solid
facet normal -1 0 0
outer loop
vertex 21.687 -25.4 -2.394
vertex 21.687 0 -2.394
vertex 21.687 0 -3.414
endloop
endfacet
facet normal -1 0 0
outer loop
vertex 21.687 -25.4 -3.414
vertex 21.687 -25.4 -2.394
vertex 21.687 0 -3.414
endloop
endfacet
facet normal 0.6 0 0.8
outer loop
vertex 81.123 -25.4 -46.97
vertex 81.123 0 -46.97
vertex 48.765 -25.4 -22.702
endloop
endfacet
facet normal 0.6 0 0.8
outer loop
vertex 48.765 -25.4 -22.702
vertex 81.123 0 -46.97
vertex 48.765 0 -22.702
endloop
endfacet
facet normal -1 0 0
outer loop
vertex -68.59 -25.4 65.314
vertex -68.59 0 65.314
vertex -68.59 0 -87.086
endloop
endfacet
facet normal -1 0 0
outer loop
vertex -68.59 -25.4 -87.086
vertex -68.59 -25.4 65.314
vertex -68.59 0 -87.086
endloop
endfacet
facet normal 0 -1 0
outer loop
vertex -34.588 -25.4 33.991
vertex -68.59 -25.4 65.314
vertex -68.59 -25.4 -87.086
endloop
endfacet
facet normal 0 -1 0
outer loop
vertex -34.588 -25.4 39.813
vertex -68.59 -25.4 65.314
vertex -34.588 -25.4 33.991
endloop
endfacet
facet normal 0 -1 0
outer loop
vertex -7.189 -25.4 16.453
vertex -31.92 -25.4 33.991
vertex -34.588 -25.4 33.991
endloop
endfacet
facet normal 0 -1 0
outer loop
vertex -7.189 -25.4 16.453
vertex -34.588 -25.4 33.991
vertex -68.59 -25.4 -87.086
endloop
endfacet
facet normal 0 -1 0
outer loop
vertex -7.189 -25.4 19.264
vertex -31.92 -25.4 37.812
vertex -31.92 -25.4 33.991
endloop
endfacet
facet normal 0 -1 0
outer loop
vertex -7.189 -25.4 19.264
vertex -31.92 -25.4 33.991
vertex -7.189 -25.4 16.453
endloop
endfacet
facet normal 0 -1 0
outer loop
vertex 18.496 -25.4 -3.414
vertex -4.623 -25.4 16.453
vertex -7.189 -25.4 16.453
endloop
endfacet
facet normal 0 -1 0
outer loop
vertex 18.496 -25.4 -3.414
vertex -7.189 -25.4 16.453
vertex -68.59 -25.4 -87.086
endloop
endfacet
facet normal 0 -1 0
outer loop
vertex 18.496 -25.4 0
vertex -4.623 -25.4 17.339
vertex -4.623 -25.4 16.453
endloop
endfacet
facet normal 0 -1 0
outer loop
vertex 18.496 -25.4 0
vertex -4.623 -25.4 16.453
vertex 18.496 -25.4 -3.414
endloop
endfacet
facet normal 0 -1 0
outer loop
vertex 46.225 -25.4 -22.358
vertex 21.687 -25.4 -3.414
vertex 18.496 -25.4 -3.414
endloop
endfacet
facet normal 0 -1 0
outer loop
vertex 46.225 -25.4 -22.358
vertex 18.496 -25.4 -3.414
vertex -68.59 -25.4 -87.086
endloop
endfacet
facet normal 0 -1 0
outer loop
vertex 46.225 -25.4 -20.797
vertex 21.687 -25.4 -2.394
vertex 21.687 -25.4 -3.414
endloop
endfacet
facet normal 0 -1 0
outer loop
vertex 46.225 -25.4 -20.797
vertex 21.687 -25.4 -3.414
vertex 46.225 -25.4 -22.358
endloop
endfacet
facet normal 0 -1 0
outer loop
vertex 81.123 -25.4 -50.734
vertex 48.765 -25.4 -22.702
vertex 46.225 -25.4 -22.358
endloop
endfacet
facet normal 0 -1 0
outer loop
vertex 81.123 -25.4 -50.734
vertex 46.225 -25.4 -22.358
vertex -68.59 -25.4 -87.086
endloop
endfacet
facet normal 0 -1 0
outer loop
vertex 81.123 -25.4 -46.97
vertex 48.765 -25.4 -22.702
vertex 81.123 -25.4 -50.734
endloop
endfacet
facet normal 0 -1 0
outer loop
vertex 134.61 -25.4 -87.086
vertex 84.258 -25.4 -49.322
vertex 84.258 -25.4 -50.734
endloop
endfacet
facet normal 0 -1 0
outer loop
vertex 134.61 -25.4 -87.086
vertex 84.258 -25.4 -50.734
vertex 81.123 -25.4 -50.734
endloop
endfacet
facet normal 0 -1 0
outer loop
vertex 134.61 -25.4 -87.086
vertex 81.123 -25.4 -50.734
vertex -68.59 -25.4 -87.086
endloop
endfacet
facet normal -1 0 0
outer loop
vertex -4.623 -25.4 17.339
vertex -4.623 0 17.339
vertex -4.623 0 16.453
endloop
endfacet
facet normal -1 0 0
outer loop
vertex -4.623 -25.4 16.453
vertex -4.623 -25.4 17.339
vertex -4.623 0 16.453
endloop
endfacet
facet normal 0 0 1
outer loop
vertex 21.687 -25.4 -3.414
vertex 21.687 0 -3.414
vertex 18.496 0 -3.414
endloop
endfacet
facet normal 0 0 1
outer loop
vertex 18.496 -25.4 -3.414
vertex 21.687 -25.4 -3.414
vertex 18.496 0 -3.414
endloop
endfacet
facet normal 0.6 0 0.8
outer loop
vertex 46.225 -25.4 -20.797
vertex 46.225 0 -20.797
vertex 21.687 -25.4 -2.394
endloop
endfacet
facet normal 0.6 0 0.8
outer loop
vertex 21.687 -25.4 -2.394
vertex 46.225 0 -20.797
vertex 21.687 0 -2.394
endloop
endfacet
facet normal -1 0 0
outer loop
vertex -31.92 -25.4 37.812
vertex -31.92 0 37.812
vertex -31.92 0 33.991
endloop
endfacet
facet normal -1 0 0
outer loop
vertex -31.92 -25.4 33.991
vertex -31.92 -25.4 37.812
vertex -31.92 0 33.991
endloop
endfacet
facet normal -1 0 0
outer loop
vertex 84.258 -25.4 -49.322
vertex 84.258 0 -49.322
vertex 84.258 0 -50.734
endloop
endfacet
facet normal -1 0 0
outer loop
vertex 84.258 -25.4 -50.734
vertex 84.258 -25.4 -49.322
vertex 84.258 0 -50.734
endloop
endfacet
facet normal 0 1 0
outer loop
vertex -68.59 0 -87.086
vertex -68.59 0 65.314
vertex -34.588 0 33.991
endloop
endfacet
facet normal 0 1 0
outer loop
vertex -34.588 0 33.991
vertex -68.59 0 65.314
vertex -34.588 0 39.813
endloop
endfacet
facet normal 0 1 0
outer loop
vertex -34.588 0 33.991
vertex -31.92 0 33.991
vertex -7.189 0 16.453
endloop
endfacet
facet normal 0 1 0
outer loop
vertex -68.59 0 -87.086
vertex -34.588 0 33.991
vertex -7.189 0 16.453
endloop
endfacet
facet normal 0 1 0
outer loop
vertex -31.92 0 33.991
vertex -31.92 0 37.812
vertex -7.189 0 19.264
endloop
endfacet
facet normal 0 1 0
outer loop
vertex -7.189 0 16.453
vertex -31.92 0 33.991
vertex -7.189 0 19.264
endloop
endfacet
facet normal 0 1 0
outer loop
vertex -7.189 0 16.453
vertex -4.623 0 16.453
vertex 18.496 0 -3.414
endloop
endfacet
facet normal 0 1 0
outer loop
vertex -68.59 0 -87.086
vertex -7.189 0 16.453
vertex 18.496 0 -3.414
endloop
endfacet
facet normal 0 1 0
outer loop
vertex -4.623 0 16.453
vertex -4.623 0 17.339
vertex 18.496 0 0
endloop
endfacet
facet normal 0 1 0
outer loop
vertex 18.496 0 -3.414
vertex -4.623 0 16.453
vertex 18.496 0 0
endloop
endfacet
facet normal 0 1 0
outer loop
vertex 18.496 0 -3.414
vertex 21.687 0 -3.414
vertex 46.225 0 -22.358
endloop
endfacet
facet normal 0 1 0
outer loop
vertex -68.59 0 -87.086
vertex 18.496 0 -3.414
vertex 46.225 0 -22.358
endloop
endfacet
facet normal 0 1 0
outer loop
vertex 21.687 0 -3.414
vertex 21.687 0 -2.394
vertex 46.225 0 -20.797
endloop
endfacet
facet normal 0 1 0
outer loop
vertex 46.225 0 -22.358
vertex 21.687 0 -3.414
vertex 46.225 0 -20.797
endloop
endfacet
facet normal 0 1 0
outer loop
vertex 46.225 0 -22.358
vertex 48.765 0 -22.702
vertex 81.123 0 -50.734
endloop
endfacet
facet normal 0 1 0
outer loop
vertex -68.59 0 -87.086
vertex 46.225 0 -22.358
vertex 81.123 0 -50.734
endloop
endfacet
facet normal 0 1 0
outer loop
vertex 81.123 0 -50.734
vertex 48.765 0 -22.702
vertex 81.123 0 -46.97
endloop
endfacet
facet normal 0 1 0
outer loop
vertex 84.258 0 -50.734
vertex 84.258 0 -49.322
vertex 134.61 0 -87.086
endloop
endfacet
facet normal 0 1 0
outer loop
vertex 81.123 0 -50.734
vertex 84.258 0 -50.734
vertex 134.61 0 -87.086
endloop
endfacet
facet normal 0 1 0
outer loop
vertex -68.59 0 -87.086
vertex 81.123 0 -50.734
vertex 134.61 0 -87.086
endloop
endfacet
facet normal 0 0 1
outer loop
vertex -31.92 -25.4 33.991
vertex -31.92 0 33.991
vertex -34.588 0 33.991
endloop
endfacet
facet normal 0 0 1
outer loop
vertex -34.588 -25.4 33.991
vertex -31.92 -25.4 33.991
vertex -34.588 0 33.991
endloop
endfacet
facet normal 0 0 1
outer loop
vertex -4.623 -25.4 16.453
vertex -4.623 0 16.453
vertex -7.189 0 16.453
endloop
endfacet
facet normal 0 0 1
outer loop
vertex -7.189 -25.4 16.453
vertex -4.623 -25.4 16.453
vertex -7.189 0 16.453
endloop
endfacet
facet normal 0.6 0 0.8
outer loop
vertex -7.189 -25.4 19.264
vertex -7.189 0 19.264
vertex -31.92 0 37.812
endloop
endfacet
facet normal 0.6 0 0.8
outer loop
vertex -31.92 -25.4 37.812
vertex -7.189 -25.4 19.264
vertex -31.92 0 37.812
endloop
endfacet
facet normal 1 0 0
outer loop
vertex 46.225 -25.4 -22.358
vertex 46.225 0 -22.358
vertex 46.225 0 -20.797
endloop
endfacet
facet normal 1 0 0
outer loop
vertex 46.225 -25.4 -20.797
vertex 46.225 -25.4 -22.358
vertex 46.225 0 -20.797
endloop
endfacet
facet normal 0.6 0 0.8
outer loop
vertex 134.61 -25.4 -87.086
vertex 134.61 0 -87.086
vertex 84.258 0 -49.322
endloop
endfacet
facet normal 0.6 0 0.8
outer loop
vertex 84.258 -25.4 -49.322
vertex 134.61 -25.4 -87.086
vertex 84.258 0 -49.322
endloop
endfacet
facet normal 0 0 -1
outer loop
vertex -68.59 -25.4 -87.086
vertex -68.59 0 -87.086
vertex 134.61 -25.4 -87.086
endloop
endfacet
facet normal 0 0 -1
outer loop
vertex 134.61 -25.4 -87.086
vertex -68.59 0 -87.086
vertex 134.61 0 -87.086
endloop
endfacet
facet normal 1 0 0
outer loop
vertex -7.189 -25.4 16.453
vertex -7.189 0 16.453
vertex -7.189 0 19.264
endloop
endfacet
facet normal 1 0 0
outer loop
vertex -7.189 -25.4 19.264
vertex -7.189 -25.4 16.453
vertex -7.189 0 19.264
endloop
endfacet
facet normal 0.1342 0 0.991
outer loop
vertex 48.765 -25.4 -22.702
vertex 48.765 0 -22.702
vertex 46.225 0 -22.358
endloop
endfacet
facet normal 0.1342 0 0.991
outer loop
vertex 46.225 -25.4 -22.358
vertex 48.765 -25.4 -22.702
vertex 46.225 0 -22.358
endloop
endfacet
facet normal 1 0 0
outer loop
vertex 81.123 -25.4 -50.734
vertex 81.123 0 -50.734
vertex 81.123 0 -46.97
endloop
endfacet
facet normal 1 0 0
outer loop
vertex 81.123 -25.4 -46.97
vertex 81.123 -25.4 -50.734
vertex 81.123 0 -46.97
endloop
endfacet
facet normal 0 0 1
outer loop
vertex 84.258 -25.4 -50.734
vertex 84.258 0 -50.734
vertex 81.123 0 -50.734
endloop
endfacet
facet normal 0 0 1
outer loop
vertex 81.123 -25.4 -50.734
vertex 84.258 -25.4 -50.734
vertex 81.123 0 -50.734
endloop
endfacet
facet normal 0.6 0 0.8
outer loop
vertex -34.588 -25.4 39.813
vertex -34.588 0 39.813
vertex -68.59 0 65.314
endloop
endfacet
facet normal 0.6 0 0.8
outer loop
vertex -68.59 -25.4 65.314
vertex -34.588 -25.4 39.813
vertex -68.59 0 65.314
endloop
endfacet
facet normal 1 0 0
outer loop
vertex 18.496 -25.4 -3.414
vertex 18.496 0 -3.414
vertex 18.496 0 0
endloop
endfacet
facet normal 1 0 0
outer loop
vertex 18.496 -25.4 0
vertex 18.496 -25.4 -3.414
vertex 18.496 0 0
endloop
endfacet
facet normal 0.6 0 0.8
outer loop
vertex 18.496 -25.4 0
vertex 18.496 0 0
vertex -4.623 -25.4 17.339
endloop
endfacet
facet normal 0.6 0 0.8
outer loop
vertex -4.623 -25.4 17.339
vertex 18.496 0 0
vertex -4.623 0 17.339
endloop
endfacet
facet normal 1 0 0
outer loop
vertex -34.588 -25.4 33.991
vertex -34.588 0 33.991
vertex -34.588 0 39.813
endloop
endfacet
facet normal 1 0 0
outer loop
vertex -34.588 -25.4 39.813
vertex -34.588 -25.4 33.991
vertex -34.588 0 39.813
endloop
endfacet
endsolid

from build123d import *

# Parameters (mm, degrees)
F1_DEPTH = 25.4


with BuildPart() as f1:
    # F0 (on Front) → F1 (new body)
    with BuildSketch(Plane.XZ):
        Polygon((-34.587627, 39.812567), (-68.589919, 65.314286), (-68.589919, -87.085714), align=None)
        Polygon((81.122858, -46.970297), (-68.589919, -87.085714), (134.610081, -87.085714), (84.258229, -49.321825), (84.258229, -50.733879), (81.122858, -50.733879), align=None)
        Polygon((-34.587627, 39.812567), (-68.589919, -87.085714), (-7.189081, 19.263657), (-31.920042, 37.811878), (-31.920042, 33.991322), (-34.587627, 33.991322), align=None)
        Polygon((-7.189081, 19.263657), (-68.589919, -87.085714), (18.495796, 0), (-4.62309, 17.339164), (-4.62309, 16.45257), (-7.189081, 16.45257), align=None)
        Polygon((18.495796, 0), (-68.589919, -87.085714), (46.225291, -20.797122), (21.687223, -2.39357), (21.687223, -3.414334), (18.495796, -3.414334), align=None)
        Polygon((46.225291, -20.797122), (-68.589919, -87.085714), (81.122858, -46.970297), (48.765291, -22.702122), (46.225291, -22.35774), align=None)
    extrude(amount=F1_DEPTH)


solid = f1.part
